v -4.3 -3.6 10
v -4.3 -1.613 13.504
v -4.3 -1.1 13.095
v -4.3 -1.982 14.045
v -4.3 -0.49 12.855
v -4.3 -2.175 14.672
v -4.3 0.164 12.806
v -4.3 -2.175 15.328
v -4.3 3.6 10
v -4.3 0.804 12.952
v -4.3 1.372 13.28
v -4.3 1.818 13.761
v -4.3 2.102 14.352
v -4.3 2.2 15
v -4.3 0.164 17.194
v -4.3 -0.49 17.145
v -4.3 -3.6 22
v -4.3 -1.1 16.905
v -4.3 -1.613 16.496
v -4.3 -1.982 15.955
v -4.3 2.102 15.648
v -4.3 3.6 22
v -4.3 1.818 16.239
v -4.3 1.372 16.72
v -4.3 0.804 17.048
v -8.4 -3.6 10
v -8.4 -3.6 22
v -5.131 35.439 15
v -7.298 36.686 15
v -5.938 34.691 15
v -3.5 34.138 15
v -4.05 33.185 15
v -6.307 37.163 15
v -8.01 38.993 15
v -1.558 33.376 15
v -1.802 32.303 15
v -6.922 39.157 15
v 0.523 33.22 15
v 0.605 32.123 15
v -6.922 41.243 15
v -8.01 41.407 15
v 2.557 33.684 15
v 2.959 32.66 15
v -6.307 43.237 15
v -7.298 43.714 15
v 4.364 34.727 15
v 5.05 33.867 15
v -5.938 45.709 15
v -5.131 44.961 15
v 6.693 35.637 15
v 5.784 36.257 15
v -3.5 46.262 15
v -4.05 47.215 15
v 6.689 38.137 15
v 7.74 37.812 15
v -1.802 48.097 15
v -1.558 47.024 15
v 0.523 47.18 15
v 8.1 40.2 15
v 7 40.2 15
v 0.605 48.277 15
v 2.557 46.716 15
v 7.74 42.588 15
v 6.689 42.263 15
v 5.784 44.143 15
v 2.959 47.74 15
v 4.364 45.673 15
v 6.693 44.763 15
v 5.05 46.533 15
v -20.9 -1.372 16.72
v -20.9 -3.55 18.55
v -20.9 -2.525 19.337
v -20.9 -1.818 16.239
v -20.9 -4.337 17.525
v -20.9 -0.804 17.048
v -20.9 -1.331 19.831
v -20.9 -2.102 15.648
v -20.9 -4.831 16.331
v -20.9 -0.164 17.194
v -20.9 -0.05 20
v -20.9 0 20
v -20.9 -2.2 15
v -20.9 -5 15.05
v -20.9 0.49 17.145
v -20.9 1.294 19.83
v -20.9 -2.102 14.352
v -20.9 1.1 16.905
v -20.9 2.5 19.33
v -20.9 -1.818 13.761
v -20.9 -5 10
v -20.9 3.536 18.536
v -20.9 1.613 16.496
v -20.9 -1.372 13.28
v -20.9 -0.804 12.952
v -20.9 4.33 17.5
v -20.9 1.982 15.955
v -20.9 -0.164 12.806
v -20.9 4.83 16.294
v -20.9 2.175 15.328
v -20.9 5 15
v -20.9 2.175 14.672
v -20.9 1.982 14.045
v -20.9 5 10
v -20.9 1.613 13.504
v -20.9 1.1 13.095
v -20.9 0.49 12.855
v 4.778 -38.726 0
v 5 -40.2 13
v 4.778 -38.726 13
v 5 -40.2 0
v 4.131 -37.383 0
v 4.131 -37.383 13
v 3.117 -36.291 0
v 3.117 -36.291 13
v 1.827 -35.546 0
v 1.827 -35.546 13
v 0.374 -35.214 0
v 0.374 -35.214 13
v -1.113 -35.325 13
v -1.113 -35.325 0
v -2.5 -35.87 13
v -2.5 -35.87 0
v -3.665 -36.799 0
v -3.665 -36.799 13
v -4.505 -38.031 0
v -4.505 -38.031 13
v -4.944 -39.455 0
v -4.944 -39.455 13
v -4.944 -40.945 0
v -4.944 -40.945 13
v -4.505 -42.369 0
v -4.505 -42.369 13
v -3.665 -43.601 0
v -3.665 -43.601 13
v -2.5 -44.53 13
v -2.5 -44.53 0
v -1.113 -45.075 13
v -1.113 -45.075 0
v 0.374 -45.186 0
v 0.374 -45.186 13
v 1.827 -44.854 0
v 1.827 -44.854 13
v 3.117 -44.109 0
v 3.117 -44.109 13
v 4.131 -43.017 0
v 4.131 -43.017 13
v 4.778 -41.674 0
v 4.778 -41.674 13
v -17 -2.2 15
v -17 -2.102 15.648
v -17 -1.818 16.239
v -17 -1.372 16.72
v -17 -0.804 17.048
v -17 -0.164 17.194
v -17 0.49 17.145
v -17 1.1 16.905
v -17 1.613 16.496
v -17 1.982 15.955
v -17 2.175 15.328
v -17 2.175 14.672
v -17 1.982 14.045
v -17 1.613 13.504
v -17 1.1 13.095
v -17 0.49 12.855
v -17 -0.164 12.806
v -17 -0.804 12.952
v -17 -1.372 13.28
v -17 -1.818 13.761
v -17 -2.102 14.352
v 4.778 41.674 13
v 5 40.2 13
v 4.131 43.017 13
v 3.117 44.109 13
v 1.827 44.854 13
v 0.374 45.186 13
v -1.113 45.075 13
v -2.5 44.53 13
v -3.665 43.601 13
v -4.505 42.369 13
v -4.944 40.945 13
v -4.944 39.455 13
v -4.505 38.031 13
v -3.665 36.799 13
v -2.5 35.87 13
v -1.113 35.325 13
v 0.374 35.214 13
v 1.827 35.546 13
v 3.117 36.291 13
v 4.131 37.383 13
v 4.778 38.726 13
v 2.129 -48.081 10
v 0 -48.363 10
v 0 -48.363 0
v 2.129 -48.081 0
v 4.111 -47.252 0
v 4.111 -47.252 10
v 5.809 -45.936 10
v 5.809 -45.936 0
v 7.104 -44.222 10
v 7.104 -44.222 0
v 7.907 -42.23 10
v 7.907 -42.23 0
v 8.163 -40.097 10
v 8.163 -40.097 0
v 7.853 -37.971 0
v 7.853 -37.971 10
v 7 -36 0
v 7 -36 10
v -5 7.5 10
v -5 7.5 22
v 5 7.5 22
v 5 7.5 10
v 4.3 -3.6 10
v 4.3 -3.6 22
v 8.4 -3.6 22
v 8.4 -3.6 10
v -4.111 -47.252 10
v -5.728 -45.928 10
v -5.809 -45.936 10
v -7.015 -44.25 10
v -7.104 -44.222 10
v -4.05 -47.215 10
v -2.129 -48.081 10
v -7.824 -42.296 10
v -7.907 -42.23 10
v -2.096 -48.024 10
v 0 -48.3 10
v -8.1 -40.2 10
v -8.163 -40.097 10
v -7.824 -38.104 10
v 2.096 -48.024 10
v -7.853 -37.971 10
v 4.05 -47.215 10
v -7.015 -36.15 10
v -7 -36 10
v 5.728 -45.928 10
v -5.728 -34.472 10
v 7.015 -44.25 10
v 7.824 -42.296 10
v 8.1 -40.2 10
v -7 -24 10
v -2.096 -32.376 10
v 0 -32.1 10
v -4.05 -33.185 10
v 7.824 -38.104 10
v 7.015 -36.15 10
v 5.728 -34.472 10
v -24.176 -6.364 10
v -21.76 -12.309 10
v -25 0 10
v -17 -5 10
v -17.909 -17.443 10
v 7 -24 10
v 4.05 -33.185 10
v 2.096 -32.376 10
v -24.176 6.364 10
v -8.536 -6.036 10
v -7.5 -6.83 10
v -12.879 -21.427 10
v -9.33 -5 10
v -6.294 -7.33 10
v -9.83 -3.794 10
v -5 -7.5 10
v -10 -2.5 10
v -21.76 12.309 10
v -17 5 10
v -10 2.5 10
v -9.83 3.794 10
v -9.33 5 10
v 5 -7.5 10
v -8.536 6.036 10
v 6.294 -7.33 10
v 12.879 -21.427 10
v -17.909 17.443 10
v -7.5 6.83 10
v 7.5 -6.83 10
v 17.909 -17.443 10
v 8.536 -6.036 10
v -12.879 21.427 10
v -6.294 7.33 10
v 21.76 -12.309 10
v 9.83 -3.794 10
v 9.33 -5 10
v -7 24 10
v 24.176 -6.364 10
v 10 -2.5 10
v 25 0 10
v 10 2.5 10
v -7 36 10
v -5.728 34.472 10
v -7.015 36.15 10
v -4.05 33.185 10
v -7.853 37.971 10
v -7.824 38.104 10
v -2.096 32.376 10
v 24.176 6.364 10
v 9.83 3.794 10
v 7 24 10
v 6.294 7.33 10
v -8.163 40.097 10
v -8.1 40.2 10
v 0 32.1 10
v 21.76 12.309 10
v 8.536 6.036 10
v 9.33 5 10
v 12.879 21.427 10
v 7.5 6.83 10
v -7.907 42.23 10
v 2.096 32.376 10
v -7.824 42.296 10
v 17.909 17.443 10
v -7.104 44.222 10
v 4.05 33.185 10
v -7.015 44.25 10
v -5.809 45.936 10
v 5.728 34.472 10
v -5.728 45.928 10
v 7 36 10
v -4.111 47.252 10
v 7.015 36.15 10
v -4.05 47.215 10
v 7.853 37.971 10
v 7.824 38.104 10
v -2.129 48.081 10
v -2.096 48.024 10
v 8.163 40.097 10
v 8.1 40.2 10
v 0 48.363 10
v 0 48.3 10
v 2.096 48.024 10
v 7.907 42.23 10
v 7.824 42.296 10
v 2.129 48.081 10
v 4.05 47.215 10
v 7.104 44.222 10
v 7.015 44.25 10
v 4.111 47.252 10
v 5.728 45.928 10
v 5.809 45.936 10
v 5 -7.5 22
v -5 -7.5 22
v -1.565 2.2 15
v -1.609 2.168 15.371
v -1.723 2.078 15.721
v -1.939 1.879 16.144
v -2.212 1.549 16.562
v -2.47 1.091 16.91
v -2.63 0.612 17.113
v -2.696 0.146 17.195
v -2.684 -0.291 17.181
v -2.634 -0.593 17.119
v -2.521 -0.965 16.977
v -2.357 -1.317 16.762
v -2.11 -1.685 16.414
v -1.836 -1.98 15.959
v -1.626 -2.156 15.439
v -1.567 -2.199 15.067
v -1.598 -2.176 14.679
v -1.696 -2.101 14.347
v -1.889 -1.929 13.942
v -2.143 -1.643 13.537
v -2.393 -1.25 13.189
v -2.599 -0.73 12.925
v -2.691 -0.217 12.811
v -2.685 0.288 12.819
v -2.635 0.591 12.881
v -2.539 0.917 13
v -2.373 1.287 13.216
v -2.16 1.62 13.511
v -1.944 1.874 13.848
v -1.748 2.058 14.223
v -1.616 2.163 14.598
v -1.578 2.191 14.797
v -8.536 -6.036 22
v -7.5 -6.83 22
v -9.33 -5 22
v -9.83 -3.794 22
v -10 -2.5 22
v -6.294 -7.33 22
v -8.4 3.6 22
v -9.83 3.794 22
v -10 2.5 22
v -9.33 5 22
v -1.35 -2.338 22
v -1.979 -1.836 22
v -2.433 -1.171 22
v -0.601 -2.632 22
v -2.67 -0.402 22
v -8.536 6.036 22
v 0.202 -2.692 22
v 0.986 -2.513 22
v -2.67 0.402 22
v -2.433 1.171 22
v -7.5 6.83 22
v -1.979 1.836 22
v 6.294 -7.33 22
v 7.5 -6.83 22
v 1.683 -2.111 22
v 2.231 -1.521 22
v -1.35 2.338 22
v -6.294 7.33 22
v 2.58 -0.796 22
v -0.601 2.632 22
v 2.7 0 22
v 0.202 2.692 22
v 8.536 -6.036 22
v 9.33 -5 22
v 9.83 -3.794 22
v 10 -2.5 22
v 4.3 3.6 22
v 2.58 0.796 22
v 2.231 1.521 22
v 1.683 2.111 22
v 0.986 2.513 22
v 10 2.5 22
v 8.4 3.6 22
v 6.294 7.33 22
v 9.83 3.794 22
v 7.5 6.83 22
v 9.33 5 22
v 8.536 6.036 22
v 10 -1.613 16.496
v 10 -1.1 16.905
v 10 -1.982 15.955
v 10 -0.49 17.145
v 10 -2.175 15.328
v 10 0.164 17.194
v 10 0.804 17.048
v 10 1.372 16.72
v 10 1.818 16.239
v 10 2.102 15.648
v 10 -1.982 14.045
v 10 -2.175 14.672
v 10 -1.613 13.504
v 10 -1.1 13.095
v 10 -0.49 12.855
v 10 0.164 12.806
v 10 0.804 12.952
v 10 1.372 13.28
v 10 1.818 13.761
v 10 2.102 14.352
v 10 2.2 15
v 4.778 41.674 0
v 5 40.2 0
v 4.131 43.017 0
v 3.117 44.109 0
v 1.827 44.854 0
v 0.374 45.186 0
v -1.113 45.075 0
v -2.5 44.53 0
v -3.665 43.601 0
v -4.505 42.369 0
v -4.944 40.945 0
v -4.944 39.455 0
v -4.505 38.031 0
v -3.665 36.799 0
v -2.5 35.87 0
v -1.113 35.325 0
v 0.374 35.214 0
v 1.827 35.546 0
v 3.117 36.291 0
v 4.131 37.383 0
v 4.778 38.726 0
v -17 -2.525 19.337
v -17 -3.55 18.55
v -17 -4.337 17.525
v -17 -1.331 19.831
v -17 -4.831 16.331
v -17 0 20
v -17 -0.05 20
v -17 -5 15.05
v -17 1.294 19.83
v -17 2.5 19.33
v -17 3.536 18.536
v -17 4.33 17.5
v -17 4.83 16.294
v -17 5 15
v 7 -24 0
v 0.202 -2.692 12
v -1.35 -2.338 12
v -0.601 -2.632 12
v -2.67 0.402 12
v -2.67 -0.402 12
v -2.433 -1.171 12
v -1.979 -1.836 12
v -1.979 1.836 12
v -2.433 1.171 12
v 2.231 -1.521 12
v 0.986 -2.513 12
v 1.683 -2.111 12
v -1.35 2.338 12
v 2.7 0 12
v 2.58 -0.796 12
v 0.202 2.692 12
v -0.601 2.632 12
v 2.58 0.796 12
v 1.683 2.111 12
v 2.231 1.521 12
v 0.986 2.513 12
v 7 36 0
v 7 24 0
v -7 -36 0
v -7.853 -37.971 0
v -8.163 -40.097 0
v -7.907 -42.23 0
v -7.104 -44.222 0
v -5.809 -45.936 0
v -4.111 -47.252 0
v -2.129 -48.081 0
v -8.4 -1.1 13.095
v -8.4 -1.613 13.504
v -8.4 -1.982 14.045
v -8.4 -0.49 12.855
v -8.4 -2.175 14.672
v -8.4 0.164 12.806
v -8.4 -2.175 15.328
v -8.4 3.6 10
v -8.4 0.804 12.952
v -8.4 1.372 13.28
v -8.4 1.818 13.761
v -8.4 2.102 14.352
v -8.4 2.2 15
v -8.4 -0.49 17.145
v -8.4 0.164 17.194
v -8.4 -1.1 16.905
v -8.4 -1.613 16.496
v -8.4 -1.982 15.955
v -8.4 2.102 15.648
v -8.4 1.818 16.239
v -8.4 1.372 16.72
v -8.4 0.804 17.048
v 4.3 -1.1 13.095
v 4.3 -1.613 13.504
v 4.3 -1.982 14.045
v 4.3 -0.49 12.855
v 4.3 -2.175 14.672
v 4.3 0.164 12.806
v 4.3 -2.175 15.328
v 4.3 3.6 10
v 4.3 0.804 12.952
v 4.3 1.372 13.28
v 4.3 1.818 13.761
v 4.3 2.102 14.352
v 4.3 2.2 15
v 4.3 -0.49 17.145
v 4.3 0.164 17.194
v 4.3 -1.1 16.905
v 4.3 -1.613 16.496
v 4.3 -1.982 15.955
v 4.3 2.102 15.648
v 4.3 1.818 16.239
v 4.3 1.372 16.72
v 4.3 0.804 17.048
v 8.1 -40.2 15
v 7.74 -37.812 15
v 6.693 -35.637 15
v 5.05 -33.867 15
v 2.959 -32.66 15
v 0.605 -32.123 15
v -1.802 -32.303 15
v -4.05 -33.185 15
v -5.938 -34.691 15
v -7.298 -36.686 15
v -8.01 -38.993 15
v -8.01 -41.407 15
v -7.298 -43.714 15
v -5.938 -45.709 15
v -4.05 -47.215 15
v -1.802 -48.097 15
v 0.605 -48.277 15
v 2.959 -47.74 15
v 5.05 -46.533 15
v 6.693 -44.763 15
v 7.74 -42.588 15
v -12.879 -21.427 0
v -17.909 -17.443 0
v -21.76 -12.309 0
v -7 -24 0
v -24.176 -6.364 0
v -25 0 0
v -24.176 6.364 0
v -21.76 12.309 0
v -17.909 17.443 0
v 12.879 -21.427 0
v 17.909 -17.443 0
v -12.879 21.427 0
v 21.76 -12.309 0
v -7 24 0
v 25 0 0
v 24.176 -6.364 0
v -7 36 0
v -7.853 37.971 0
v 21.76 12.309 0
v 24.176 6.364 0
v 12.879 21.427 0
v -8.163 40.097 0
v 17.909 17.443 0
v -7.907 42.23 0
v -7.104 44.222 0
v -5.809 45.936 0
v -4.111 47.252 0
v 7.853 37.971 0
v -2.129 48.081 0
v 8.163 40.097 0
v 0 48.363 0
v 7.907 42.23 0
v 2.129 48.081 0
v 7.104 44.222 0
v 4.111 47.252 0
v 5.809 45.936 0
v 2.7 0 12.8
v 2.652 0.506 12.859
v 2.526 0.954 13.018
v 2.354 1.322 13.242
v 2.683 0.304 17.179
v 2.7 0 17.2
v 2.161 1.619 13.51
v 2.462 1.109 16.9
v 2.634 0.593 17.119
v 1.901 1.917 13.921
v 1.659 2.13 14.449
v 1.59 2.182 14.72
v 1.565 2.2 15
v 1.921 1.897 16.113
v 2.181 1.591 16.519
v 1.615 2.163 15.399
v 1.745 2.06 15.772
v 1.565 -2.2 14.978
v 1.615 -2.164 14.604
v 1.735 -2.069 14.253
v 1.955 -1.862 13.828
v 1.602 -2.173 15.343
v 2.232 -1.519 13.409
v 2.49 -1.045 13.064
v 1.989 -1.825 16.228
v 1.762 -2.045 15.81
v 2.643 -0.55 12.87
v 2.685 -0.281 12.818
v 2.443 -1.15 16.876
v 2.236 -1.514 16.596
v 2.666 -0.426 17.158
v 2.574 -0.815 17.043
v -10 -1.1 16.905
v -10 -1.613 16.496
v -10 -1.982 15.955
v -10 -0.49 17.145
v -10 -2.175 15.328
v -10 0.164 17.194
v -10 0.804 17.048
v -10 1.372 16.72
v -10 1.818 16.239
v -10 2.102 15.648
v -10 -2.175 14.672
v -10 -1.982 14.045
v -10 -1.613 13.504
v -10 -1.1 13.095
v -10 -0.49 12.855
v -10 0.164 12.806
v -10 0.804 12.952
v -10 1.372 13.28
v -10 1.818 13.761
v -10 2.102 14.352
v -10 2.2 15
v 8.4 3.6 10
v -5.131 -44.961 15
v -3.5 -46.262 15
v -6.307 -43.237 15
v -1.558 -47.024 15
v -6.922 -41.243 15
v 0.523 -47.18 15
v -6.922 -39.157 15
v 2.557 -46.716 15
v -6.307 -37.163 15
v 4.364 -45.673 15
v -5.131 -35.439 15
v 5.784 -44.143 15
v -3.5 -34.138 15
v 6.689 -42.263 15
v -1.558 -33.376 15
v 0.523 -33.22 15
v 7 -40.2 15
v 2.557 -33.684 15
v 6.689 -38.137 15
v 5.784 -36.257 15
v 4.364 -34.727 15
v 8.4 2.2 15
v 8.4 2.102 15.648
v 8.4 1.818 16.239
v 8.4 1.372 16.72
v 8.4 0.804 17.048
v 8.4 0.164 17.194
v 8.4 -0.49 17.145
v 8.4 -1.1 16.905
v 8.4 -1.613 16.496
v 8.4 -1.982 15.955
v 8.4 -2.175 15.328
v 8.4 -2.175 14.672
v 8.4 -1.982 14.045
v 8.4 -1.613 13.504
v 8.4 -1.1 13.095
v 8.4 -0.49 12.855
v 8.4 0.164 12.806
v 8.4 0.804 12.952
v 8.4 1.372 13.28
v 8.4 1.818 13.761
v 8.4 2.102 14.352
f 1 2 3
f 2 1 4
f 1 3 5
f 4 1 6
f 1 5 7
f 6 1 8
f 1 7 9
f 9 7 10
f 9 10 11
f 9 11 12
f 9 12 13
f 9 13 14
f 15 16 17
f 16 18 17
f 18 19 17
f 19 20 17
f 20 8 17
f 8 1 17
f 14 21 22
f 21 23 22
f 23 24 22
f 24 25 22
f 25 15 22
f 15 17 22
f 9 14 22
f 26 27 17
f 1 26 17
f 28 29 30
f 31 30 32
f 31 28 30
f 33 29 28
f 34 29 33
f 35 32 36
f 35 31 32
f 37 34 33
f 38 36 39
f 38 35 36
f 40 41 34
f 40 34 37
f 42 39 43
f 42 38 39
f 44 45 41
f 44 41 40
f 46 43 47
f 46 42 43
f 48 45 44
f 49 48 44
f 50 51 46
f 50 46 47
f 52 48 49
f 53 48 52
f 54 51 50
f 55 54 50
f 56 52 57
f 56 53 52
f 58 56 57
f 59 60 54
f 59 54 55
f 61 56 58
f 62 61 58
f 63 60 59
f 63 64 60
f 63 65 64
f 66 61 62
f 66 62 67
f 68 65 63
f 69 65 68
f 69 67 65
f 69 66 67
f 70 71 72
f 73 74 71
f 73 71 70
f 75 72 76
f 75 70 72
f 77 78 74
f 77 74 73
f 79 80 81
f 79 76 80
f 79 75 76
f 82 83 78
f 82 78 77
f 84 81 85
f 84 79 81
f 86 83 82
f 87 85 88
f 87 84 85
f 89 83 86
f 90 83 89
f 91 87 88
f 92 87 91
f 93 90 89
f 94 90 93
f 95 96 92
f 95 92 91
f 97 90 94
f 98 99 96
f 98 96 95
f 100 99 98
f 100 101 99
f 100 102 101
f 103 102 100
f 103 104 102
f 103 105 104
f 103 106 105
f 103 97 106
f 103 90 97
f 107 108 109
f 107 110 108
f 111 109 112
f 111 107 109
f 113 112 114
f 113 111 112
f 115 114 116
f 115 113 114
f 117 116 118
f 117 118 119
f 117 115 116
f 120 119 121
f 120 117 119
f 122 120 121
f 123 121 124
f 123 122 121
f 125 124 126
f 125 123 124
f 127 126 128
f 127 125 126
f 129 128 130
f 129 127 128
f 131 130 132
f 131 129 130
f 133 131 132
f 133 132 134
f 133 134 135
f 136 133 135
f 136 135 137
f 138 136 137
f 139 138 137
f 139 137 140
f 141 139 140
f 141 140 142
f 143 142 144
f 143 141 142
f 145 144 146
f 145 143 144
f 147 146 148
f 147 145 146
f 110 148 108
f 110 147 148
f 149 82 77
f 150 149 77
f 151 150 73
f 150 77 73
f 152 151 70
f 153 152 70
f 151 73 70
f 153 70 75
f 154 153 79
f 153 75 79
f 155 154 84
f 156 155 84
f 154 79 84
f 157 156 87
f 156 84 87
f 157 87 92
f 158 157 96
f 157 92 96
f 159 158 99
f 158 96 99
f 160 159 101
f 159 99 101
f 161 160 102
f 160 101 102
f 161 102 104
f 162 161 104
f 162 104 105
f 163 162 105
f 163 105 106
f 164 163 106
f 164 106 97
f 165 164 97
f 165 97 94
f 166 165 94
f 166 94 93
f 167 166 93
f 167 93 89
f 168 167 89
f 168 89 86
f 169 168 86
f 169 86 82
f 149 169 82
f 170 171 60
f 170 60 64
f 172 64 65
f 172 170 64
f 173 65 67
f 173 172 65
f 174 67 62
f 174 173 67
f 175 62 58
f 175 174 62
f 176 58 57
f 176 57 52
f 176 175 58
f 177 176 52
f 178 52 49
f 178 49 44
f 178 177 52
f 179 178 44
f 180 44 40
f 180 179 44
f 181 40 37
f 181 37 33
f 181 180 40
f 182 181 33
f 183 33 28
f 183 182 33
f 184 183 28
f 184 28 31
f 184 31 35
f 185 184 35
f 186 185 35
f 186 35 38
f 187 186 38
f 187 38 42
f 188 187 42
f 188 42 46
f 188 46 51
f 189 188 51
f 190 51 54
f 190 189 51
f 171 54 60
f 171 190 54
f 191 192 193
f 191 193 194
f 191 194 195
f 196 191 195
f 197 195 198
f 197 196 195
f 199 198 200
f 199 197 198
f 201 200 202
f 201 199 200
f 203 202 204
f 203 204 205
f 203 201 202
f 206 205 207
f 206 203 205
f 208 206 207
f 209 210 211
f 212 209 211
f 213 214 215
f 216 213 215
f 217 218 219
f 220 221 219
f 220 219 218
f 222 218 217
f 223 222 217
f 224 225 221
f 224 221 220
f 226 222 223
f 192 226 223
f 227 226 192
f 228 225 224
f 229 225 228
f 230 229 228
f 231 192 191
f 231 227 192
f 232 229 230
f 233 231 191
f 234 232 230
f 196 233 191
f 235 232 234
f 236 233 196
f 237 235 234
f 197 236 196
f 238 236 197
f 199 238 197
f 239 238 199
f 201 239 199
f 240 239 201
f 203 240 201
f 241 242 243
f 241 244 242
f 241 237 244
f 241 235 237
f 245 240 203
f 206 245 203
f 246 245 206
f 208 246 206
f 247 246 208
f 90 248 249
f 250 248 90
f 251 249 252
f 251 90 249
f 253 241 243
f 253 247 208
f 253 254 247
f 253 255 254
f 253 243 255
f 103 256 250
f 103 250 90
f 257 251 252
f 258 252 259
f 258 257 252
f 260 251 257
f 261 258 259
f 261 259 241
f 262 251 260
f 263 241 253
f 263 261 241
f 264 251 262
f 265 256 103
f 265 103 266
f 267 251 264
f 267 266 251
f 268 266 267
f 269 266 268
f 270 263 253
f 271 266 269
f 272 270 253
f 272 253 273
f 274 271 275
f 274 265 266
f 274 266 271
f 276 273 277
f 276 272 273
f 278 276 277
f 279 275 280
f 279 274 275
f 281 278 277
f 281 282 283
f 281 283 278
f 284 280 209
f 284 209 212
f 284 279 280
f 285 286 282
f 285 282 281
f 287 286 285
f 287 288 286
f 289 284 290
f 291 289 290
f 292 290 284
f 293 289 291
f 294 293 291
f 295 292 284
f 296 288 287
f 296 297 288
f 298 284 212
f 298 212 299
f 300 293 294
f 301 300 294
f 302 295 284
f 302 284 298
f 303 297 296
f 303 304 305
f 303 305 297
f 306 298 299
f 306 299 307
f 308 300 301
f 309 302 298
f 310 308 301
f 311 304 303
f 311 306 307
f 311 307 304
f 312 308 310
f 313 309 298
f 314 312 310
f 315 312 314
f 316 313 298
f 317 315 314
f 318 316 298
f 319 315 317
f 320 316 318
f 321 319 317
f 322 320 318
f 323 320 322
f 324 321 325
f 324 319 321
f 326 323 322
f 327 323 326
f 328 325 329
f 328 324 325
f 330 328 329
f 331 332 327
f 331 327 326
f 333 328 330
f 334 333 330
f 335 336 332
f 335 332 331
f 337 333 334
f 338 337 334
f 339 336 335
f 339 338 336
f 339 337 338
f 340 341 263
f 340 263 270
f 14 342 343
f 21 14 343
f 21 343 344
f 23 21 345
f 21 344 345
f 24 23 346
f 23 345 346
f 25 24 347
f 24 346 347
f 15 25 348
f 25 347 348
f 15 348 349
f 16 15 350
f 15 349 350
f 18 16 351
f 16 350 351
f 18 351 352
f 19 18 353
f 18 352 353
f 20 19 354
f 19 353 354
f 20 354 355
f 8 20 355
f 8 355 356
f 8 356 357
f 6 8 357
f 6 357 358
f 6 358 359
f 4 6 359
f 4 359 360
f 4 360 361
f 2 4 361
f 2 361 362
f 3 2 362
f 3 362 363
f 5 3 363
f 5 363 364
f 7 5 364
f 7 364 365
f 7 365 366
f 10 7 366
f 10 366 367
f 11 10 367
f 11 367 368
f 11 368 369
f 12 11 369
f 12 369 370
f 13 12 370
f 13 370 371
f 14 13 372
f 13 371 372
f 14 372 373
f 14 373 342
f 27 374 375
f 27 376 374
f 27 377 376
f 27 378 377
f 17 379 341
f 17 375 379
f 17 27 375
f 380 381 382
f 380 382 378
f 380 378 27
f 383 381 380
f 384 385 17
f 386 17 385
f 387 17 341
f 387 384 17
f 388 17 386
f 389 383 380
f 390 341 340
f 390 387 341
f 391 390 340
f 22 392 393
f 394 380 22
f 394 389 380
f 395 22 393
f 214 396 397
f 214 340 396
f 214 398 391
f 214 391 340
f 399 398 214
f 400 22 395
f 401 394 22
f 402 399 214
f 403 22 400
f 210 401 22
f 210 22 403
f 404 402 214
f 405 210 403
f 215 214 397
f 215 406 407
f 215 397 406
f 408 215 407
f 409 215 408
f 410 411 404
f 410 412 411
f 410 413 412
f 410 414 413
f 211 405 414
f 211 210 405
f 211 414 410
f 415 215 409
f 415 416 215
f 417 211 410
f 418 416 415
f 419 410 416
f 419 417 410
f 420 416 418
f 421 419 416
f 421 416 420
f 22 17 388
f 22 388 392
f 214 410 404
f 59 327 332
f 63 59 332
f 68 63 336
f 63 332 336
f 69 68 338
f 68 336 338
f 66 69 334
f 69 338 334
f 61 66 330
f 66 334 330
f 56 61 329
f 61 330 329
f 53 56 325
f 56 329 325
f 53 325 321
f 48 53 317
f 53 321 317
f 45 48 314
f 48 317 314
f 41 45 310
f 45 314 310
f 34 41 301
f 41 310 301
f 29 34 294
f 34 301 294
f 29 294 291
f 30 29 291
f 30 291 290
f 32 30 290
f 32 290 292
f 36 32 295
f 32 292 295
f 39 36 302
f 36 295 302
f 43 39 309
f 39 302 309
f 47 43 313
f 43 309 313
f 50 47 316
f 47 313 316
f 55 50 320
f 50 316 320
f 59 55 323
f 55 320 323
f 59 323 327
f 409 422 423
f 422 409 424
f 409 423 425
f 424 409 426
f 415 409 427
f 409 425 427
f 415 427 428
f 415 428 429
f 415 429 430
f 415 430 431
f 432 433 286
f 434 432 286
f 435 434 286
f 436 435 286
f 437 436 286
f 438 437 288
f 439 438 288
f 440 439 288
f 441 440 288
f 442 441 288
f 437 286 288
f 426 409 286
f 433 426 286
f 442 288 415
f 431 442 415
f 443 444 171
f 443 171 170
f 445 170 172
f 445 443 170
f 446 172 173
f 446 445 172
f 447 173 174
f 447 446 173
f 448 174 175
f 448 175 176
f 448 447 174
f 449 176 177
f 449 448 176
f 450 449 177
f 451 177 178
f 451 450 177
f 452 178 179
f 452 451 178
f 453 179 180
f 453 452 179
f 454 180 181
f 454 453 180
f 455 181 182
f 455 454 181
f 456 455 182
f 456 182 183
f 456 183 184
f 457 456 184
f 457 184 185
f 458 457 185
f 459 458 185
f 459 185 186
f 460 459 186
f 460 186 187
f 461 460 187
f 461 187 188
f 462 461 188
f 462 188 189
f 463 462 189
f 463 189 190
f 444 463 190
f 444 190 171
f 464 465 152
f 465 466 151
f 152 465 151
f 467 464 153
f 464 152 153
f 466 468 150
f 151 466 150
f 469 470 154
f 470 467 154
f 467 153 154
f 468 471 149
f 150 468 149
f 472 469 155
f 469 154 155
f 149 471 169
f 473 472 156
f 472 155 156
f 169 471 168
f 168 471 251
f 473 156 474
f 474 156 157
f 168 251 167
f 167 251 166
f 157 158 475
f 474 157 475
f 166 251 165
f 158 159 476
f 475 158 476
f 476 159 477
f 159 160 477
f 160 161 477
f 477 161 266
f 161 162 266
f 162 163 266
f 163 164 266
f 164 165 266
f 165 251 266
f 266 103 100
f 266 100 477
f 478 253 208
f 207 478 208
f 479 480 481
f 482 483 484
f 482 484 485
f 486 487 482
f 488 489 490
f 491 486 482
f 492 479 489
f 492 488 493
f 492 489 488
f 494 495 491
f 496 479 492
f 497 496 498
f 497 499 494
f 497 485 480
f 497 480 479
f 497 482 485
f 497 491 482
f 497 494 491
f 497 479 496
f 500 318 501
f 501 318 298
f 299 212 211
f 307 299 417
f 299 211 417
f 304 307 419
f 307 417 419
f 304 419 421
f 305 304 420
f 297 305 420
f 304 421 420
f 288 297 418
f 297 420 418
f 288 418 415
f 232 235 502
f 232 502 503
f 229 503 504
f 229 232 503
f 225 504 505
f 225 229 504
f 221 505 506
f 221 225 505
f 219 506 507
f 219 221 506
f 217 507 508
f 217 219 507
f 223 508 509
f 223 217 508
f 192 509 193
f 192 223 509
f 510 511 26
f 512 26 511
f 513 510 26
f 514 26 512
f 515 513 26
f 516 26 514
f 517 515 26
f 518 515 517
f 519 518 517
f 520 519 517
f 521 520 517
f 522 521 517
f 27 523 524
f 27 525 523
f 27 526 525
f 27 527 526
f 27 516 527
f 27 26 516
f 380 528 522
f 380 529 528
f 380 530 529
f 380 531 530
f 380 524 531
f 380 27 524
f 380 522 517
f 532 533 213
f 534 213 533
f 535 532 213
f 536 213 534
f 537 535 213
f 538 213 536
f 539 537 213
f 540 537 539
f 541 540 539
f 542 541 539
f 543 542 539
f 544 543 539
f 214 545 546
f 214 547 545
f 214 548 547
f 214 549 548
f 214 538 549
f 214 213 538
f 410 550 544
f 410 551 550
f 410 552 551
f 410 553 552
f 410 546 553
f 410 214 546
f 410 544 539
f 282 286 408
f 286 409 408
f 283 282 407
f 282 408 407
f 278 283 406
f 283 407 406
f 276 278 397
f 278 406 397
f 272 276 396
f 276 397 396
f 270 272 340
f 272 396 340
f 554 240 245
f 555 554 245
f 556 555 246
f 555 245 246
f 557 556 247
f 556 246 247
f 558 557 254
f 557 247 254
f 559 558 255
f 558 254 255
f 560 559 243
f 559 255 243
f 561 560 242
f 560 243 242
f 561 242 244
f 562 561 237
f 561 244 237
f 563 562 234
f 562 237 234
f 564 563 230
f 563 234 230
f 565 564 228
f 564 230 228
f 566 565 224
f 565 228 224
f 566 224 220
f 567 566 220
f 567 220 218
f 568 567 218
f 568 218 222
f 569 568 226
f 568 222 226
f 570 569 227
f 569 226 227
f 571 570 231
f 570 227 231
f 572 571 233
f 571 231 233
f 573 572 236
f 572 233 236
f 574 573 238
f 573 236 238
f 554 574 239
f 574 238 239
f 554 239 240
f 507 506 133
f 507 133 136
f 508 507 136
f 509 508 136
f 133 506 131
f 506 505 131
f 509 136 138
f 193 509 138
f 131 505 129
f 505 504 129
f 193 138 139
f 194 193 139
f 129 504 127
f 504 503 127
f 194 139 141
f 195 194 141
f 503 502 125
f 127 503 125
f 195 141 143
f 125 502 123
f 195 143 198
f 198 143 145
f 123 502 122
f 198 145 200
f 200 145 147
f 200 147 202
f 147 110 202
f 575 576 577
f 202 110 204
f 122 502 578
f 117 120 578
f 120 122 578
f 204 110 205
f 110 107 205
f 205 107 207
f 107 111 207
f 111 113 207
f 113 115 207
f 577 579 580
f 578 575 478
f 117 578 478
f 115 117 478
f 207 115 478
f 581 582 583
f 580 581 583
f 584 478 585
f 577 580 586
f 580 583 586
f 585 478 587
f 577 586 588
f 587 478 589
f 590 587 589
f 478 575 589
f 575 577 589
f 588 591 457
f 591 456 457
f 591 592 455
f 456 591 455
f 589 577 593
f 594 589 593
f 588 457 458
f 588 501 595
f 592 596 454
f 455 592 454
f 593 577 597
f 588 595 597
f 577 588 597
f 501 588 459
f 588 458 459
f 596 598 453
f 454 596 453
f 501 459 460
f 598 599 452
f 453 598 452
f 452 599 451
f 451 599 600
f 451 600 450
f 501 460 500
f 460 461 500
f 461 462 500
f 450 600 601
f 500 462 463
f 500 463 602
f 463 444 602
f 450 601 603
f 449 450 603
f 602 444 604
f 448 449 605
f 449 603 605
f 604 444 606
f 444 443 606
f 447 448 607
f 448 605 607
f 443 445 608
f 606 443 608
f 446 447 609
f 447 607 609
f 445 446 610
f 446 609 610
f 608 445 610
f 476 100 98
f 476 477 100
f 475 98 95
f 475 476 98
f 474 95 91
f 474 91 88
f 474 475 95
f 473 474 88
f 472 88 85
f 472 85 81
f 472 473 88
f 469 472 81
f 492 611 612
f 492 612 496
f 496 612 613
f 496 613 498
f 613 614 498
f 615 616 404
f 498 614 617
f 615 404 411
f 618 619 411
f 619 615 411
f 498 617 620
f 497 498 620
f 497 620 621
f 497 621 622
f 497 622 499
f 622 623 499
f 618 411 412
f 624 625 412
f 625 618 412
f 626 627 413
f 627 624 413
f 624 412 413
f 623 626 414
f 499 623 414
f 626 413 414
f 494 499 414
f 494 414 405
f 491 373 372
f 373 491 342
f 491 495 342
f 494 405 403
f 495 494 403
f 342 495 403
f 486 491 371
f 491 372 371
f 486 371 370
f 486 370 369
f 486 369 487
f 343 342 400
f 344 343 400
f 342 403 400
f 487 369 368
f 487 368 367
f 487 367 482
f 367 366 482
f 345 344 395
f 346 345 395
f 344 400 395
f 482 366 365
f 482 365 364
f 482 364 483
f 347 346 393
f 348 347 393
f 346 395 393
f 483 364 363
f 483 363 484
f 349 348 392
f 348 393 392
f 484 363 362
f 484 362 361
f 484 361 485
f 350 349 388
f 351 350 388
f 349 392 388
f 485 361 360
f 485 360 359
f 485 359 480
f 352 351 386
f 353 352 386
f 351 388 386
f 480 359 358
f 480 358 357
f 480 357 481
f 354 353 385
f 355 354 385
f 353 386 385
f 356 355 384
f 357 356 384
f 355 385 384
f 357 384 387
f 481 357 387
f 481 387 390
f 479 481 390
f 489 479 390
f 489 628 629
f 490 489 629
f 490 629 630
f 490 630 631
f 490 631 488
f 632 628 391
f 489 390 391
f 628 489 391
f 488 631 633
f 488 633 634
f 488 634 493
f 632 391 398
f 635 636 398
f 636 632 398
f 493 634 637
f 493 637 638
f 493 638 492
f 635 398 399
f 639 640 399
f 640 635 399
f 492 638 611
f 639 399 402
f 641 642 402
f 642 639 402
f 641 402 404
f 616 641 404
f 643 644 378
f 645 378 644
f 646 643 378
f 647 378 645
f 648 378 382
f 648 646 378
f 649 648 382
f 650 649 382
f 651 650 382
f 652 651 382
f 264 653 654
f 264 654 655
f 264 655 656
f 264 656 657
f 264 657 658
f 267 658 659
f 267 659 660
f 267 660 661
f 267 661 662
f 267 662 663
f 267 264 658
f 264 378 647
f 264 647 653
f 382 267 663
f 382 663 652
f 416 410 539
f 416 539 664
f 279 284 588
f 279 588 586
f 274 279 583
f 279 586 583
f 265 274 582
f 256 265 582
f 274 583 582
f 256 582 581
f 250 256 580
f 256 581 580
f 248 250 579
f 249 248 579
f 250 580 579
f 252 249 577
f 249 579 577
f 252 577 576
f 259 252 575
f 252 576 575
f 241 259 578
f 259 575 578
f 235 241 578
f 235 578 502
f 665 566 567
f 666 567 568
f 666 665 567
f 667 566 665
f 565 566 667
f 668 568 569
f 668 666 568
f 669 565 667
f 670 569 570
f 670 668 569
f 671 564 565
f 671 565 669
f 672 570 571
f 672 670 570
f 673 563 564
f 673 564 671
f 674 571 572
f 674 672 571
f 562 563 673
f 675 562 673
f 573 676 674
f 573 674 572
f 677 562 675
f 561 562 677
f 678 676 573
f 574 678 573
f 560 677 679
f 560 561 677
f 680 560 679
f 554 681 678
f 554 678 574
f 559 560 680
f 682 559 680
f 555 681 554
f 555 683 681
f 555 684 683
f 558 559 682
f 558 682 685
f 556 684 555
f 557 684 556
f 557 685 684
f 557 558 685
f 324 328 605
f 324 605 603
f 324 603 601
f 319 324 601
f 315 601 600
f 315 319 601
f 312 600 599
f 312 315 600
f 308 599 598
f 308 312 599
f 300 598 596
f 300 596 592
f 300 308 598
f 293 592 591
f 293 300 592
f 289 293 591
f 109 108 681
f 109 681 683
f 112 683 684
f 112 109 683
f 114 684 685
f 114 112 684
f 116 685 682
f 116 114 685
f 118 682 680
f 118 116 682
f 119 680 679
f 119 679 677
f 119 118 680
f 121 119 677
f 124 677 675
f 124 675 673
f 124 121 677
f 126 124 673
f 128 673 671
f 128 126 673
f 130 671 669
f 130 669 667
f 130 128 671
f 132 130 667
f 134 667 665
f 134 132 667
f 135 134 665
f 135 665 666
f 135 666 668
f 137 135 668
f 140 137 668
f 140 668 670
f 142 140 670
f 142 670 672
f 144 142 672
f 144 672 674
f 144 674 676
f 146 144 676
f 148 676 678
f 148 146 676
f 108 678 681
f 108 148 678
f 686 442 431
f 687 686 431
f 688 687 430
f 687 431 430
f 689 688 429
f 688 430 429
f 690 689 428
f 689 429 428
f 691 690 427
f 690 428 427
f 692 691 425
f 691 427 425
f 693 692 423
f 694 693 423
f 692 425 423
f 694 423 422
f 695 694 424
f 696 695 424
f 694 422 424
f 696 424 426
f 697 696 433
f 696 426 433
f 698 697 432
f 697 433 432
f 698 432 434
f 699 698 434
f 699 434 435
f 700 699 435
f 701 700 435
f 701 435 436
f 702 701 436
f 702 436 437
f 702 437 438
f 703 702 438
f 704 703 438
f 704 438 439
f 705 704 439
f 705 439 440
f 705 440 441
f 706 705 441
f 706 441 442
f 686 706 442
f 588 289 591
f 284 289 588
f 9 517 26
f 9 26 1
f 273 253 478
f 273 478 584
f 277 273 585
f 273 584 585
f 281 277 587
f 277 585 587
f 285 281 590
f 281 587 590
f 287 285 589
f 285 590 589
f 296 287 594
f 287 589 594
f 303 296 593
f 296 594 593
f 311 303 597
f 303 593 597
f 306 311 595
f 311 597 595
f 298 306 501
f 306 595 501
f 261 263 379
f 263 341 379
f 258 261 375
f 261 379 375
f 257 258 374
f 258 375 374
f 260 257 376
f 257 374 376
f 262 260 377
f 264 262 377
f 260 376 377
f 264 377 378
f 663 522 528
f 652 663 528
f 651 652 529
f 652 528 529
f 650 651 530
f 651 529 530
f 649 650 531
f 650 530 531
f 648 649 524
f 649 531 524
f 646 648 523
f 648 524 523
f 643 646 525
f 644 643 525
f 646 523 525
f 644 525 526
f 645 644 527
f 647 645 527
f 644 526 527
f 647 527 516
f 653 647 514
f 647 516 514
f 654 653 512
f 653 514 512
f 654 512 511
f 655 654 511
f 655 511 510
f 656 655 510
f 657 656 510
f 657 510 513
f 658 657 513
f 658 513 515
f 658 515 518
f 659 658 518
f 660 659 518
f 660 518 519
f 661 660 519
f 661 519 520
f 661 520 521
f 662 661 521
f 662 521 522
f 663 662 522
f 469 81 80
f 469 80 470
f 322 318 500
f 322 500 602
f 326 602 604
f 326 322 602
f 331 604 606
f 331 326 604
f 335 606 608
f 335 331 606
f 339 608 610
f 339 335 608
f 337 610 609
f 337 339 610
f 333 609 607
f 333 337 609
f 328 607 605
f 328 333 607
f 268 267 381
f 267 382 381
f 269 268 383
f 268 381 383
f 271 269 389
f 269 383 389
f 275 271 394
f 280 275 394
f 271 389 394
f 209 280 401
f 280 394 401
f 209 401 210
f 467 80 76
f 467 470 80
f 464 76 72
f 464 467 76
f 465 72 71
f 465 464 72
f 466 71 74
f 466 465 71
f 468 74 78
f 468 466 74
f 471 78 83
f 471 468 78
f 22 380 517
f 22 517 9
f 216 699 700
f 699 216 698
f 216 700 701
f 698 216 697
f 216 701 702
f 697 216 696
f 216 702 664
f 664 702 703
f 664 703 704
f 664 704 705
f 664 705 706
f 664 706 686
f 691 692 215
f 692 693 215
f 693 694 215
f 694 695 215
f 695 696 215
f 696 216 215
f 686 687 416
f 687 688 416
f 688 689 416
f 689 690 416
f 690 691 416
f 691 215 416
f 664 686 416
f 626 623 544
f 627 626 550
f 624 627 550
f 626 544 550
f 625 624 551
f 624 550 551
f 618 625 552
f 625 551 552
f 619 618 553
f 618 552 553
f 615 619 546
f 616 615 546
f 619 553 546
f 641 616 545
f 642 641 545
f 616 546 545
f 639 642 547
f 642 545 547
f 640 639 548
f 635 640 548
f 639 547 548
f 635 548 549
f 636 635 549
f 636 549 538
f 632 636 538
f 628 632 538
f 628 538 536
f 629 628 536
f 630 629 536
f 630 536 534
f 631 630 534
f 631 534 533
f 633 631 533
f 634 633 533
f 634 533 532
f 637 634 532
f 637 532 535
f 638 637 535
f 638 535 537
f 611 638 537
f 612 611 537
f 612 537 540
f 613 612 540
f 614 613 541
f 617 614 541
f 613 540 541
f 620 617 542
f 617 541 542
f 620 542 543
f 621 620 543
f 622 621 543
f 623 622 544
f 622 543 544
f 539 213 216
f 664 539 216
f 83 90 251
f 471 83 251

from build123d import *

# Parameters (mm, degrees)
SKETCH_R        = 25
PAD_DEPTH       = 10
SKETCH001_W     = 20
SKETCH001_H     = 15
PAD001_DEPTH    = 12
SKETCH002_R     = 2.7
POCKET_DEPTH    = 10
SKETCH003_W     = 4.1
SKETCH003_H     = 7.2
POCKET001_DEPTH = 12
SKETCH004_R     = 2.2
POCKET002_DEPTH = 30
FILLET_R        = 5
FILLET001_R     = 5
FILLET002_R     = 5
FILLET003_R     = 5
SKETCH005_R     = 5
PAD002_DEPTH    = 10
SKETCH006_W     = 3.9
SKETCH006_H     = 10
PAD003_DEPTH    = 10
SKETCH007_R     = 2.2
POCKET003_DEPTH = 4
SKETCH008_R     = 8.1
SKETCH008_R_2   = 5
PAD004_DEPTH    = 5
FILLET004_R     = 5
FILLET005_R     = 4.95
CHAMFER_SIZE    = 2
CHAMFER001_SIZE = 2


with BuildPart() as part:
    # Sketch → Pad (new body)
    with BuildSketch(Plane.XY):
        Circle(SKETCH_R)
    extrude(amount=PAD_DEPTH)

    # Sketch001 (on Face3 of Pad) → Pad001 (join)
    with BuildSketch(Plane.XY.offset(10)):
        Rectangle(SKETCH001_W, SKETCH001_H)
    extrude(amount=PAD001_DEPTH)

    # Sketch002 (on Face8 of Pad001) → Pocket (cut)
    with BuildSketch(Plane.XY.offset(22)):
        Circle(SKETCH002_R)
    extrude(amount=-POCKET_DEPTH, mode=Mode.SUBTRACT)

    # Sketch003 (on Face8 of Pocket) → Pocket001 (cut)
    with BuildSketch(Plane.XY.offset(22)):
        with Locations((-6.35, 0)):
            Rectangle(SKETCH003_W, SKETCH003_H)
        with Locations((6.35, 0)):
            Rectangle(SKETCH003_W, SKETCH003_H)
    extrude(amount=-POCKET001_DEPTH, mode=Mode.SUBTRACT)

    # Sketch004 (on Face6 of Pocket001) → Pocket002 (cut)
    with BuildSketch(Plane.YZ.offset(10)):
        with Locations((0, 15)):
            Circle(SKETCH004_R)
    extrude(amount=-POCKET002_DEPTH, mode=Mode.SUBTRACT)

    # Fillet
    fillet_edges = [part.edges().sort_by_distance(p)[0] for p in [
        (-10, -7.5, 16),
    ]]
    fillet(fillet_edges, radius=FILLET_R)

    # Fillet001
    fillet001_edges = [part.edges().sort_by_distance(p)[0] for p in [
        (-10, 7.5, 16),
    ]]
    fillet(fillet001_edges, radius=FILLET001_R)

    # Fillet002
    fillet002_edges = [part.edges().sort_by_distance(p)[0] for p in [
        (10, 7.5, 16),
    ]]
    fillet(fillet002_edges, radius=FILLET002_R)

    # Fillet003
    fillet003_edges = [part.edges().sort_by_distance(p)[0] for p in [
        (10, -7.5, 16),
    ]]
    fillet(fillet003_edges, radius=FILLET003_R)

    # Sketch005 (on Face1 of Fillet003) → Pad002 (join)
    with BuildSketch(Plane.XY.offset(10)):
        with BuildLine():
            Line((-7, 36), (-7, -36))
            ThreePointArc((-7, -36), (-7.103731, -44.222064), (0, -48.363333))
            ThreePointArc((0, -48.363333), (7.103731, -44.222064), (7, -36))
            Line((7, 36), (7, -36))
            ThreePointArc((7, 36), (7.103731, 44.222064), (0, 48.363333))
            ThreePointArc((0, 48.363333), (-7.103731, 44.222064), (-7, 36))
        make_face()
        with Locations((0, -40.2)):
            Circle(SKETCH005_R, mode=Mode.SUBTRACT)
        with Locations((0, 40.2)):
            Circle(SKETCH005_R, mode=Mode.SUBTRACT)
    extrude(amount=-PAD002_DEPTH)

    # Sketch006 (on Face13 of Pad002) → Pad003 (join)
    with BuildSketch(Plane.XY.offset(10)):
        with Locations((-18.95, 0)):
            Rectangle(SKETCH006_W, SKETCH006_H)
    extrude(amount=PAD003_DEPTH)

    # Sketch007 (on Face32 of Pad003) → Pocket003 (cut)
    with BuildSketch(Plane(origin=(-20.9, 0, 0), x_dir=(0, -1, 0), z_dir=(-1, 0, 0))):
        with Locations((0, 15)):
            Circle(SKETCH007_R)
    extrude(amount=-POCKET003_DEPTH, mode=Mode.SUBTRACT)

    # Sketch008 (on Face18 of Pocket003) → Pad004 (join)
    with BuildSketch(Plane.XY.offset(10)):
        with Locations((0, 40.2)):
            Circle(SKETCH008_R)
        with Locations((0, 40.2)):
            Circle(SKETCH008_R_2, mode=Mode.SUBTRACT)
        with Locations((0, -40.2)):
            Circle(SKETCH008_R)
        with Locations((0, -40.2)):
            Circle(SKETCH008_R_2, mode=Mode.SUBTRACT)
    extrude(amount=PAD004_DEPTH)

    # Fillet004
    fillet004_edges = [part.edges().sort_by_distance(p)[0] for p in [
        (-18.95, 5, 20),
    ]]
    fillet(fillet004_edges, radius=FILLET004_R)

    # Fillet005
    fillet005_edges = [part.edges().sort_by_distance(p)[0] for p in [
        (-18.95, -5, 20),
    ]]
    fillet(fillet005_edges, radius=FILLET005_R)

    # Chamfer
    chamfer_edges = [part.edges().sort_by_distance(p)[0] for p in [
        (-5, 40.2, 15),
    ]]
    chamfer(chamfer_edges, length=CHAMFER_SIZE)

    # Chamfer001
    chamfer001_edges = [part.edges().sort_by_distance(p)[0] for p in [
        (-5, -40.2, 15),
    ]]
    chamfer(chamfer001_edges, length=CHAMFER001_SIZE)


solid = part.part
